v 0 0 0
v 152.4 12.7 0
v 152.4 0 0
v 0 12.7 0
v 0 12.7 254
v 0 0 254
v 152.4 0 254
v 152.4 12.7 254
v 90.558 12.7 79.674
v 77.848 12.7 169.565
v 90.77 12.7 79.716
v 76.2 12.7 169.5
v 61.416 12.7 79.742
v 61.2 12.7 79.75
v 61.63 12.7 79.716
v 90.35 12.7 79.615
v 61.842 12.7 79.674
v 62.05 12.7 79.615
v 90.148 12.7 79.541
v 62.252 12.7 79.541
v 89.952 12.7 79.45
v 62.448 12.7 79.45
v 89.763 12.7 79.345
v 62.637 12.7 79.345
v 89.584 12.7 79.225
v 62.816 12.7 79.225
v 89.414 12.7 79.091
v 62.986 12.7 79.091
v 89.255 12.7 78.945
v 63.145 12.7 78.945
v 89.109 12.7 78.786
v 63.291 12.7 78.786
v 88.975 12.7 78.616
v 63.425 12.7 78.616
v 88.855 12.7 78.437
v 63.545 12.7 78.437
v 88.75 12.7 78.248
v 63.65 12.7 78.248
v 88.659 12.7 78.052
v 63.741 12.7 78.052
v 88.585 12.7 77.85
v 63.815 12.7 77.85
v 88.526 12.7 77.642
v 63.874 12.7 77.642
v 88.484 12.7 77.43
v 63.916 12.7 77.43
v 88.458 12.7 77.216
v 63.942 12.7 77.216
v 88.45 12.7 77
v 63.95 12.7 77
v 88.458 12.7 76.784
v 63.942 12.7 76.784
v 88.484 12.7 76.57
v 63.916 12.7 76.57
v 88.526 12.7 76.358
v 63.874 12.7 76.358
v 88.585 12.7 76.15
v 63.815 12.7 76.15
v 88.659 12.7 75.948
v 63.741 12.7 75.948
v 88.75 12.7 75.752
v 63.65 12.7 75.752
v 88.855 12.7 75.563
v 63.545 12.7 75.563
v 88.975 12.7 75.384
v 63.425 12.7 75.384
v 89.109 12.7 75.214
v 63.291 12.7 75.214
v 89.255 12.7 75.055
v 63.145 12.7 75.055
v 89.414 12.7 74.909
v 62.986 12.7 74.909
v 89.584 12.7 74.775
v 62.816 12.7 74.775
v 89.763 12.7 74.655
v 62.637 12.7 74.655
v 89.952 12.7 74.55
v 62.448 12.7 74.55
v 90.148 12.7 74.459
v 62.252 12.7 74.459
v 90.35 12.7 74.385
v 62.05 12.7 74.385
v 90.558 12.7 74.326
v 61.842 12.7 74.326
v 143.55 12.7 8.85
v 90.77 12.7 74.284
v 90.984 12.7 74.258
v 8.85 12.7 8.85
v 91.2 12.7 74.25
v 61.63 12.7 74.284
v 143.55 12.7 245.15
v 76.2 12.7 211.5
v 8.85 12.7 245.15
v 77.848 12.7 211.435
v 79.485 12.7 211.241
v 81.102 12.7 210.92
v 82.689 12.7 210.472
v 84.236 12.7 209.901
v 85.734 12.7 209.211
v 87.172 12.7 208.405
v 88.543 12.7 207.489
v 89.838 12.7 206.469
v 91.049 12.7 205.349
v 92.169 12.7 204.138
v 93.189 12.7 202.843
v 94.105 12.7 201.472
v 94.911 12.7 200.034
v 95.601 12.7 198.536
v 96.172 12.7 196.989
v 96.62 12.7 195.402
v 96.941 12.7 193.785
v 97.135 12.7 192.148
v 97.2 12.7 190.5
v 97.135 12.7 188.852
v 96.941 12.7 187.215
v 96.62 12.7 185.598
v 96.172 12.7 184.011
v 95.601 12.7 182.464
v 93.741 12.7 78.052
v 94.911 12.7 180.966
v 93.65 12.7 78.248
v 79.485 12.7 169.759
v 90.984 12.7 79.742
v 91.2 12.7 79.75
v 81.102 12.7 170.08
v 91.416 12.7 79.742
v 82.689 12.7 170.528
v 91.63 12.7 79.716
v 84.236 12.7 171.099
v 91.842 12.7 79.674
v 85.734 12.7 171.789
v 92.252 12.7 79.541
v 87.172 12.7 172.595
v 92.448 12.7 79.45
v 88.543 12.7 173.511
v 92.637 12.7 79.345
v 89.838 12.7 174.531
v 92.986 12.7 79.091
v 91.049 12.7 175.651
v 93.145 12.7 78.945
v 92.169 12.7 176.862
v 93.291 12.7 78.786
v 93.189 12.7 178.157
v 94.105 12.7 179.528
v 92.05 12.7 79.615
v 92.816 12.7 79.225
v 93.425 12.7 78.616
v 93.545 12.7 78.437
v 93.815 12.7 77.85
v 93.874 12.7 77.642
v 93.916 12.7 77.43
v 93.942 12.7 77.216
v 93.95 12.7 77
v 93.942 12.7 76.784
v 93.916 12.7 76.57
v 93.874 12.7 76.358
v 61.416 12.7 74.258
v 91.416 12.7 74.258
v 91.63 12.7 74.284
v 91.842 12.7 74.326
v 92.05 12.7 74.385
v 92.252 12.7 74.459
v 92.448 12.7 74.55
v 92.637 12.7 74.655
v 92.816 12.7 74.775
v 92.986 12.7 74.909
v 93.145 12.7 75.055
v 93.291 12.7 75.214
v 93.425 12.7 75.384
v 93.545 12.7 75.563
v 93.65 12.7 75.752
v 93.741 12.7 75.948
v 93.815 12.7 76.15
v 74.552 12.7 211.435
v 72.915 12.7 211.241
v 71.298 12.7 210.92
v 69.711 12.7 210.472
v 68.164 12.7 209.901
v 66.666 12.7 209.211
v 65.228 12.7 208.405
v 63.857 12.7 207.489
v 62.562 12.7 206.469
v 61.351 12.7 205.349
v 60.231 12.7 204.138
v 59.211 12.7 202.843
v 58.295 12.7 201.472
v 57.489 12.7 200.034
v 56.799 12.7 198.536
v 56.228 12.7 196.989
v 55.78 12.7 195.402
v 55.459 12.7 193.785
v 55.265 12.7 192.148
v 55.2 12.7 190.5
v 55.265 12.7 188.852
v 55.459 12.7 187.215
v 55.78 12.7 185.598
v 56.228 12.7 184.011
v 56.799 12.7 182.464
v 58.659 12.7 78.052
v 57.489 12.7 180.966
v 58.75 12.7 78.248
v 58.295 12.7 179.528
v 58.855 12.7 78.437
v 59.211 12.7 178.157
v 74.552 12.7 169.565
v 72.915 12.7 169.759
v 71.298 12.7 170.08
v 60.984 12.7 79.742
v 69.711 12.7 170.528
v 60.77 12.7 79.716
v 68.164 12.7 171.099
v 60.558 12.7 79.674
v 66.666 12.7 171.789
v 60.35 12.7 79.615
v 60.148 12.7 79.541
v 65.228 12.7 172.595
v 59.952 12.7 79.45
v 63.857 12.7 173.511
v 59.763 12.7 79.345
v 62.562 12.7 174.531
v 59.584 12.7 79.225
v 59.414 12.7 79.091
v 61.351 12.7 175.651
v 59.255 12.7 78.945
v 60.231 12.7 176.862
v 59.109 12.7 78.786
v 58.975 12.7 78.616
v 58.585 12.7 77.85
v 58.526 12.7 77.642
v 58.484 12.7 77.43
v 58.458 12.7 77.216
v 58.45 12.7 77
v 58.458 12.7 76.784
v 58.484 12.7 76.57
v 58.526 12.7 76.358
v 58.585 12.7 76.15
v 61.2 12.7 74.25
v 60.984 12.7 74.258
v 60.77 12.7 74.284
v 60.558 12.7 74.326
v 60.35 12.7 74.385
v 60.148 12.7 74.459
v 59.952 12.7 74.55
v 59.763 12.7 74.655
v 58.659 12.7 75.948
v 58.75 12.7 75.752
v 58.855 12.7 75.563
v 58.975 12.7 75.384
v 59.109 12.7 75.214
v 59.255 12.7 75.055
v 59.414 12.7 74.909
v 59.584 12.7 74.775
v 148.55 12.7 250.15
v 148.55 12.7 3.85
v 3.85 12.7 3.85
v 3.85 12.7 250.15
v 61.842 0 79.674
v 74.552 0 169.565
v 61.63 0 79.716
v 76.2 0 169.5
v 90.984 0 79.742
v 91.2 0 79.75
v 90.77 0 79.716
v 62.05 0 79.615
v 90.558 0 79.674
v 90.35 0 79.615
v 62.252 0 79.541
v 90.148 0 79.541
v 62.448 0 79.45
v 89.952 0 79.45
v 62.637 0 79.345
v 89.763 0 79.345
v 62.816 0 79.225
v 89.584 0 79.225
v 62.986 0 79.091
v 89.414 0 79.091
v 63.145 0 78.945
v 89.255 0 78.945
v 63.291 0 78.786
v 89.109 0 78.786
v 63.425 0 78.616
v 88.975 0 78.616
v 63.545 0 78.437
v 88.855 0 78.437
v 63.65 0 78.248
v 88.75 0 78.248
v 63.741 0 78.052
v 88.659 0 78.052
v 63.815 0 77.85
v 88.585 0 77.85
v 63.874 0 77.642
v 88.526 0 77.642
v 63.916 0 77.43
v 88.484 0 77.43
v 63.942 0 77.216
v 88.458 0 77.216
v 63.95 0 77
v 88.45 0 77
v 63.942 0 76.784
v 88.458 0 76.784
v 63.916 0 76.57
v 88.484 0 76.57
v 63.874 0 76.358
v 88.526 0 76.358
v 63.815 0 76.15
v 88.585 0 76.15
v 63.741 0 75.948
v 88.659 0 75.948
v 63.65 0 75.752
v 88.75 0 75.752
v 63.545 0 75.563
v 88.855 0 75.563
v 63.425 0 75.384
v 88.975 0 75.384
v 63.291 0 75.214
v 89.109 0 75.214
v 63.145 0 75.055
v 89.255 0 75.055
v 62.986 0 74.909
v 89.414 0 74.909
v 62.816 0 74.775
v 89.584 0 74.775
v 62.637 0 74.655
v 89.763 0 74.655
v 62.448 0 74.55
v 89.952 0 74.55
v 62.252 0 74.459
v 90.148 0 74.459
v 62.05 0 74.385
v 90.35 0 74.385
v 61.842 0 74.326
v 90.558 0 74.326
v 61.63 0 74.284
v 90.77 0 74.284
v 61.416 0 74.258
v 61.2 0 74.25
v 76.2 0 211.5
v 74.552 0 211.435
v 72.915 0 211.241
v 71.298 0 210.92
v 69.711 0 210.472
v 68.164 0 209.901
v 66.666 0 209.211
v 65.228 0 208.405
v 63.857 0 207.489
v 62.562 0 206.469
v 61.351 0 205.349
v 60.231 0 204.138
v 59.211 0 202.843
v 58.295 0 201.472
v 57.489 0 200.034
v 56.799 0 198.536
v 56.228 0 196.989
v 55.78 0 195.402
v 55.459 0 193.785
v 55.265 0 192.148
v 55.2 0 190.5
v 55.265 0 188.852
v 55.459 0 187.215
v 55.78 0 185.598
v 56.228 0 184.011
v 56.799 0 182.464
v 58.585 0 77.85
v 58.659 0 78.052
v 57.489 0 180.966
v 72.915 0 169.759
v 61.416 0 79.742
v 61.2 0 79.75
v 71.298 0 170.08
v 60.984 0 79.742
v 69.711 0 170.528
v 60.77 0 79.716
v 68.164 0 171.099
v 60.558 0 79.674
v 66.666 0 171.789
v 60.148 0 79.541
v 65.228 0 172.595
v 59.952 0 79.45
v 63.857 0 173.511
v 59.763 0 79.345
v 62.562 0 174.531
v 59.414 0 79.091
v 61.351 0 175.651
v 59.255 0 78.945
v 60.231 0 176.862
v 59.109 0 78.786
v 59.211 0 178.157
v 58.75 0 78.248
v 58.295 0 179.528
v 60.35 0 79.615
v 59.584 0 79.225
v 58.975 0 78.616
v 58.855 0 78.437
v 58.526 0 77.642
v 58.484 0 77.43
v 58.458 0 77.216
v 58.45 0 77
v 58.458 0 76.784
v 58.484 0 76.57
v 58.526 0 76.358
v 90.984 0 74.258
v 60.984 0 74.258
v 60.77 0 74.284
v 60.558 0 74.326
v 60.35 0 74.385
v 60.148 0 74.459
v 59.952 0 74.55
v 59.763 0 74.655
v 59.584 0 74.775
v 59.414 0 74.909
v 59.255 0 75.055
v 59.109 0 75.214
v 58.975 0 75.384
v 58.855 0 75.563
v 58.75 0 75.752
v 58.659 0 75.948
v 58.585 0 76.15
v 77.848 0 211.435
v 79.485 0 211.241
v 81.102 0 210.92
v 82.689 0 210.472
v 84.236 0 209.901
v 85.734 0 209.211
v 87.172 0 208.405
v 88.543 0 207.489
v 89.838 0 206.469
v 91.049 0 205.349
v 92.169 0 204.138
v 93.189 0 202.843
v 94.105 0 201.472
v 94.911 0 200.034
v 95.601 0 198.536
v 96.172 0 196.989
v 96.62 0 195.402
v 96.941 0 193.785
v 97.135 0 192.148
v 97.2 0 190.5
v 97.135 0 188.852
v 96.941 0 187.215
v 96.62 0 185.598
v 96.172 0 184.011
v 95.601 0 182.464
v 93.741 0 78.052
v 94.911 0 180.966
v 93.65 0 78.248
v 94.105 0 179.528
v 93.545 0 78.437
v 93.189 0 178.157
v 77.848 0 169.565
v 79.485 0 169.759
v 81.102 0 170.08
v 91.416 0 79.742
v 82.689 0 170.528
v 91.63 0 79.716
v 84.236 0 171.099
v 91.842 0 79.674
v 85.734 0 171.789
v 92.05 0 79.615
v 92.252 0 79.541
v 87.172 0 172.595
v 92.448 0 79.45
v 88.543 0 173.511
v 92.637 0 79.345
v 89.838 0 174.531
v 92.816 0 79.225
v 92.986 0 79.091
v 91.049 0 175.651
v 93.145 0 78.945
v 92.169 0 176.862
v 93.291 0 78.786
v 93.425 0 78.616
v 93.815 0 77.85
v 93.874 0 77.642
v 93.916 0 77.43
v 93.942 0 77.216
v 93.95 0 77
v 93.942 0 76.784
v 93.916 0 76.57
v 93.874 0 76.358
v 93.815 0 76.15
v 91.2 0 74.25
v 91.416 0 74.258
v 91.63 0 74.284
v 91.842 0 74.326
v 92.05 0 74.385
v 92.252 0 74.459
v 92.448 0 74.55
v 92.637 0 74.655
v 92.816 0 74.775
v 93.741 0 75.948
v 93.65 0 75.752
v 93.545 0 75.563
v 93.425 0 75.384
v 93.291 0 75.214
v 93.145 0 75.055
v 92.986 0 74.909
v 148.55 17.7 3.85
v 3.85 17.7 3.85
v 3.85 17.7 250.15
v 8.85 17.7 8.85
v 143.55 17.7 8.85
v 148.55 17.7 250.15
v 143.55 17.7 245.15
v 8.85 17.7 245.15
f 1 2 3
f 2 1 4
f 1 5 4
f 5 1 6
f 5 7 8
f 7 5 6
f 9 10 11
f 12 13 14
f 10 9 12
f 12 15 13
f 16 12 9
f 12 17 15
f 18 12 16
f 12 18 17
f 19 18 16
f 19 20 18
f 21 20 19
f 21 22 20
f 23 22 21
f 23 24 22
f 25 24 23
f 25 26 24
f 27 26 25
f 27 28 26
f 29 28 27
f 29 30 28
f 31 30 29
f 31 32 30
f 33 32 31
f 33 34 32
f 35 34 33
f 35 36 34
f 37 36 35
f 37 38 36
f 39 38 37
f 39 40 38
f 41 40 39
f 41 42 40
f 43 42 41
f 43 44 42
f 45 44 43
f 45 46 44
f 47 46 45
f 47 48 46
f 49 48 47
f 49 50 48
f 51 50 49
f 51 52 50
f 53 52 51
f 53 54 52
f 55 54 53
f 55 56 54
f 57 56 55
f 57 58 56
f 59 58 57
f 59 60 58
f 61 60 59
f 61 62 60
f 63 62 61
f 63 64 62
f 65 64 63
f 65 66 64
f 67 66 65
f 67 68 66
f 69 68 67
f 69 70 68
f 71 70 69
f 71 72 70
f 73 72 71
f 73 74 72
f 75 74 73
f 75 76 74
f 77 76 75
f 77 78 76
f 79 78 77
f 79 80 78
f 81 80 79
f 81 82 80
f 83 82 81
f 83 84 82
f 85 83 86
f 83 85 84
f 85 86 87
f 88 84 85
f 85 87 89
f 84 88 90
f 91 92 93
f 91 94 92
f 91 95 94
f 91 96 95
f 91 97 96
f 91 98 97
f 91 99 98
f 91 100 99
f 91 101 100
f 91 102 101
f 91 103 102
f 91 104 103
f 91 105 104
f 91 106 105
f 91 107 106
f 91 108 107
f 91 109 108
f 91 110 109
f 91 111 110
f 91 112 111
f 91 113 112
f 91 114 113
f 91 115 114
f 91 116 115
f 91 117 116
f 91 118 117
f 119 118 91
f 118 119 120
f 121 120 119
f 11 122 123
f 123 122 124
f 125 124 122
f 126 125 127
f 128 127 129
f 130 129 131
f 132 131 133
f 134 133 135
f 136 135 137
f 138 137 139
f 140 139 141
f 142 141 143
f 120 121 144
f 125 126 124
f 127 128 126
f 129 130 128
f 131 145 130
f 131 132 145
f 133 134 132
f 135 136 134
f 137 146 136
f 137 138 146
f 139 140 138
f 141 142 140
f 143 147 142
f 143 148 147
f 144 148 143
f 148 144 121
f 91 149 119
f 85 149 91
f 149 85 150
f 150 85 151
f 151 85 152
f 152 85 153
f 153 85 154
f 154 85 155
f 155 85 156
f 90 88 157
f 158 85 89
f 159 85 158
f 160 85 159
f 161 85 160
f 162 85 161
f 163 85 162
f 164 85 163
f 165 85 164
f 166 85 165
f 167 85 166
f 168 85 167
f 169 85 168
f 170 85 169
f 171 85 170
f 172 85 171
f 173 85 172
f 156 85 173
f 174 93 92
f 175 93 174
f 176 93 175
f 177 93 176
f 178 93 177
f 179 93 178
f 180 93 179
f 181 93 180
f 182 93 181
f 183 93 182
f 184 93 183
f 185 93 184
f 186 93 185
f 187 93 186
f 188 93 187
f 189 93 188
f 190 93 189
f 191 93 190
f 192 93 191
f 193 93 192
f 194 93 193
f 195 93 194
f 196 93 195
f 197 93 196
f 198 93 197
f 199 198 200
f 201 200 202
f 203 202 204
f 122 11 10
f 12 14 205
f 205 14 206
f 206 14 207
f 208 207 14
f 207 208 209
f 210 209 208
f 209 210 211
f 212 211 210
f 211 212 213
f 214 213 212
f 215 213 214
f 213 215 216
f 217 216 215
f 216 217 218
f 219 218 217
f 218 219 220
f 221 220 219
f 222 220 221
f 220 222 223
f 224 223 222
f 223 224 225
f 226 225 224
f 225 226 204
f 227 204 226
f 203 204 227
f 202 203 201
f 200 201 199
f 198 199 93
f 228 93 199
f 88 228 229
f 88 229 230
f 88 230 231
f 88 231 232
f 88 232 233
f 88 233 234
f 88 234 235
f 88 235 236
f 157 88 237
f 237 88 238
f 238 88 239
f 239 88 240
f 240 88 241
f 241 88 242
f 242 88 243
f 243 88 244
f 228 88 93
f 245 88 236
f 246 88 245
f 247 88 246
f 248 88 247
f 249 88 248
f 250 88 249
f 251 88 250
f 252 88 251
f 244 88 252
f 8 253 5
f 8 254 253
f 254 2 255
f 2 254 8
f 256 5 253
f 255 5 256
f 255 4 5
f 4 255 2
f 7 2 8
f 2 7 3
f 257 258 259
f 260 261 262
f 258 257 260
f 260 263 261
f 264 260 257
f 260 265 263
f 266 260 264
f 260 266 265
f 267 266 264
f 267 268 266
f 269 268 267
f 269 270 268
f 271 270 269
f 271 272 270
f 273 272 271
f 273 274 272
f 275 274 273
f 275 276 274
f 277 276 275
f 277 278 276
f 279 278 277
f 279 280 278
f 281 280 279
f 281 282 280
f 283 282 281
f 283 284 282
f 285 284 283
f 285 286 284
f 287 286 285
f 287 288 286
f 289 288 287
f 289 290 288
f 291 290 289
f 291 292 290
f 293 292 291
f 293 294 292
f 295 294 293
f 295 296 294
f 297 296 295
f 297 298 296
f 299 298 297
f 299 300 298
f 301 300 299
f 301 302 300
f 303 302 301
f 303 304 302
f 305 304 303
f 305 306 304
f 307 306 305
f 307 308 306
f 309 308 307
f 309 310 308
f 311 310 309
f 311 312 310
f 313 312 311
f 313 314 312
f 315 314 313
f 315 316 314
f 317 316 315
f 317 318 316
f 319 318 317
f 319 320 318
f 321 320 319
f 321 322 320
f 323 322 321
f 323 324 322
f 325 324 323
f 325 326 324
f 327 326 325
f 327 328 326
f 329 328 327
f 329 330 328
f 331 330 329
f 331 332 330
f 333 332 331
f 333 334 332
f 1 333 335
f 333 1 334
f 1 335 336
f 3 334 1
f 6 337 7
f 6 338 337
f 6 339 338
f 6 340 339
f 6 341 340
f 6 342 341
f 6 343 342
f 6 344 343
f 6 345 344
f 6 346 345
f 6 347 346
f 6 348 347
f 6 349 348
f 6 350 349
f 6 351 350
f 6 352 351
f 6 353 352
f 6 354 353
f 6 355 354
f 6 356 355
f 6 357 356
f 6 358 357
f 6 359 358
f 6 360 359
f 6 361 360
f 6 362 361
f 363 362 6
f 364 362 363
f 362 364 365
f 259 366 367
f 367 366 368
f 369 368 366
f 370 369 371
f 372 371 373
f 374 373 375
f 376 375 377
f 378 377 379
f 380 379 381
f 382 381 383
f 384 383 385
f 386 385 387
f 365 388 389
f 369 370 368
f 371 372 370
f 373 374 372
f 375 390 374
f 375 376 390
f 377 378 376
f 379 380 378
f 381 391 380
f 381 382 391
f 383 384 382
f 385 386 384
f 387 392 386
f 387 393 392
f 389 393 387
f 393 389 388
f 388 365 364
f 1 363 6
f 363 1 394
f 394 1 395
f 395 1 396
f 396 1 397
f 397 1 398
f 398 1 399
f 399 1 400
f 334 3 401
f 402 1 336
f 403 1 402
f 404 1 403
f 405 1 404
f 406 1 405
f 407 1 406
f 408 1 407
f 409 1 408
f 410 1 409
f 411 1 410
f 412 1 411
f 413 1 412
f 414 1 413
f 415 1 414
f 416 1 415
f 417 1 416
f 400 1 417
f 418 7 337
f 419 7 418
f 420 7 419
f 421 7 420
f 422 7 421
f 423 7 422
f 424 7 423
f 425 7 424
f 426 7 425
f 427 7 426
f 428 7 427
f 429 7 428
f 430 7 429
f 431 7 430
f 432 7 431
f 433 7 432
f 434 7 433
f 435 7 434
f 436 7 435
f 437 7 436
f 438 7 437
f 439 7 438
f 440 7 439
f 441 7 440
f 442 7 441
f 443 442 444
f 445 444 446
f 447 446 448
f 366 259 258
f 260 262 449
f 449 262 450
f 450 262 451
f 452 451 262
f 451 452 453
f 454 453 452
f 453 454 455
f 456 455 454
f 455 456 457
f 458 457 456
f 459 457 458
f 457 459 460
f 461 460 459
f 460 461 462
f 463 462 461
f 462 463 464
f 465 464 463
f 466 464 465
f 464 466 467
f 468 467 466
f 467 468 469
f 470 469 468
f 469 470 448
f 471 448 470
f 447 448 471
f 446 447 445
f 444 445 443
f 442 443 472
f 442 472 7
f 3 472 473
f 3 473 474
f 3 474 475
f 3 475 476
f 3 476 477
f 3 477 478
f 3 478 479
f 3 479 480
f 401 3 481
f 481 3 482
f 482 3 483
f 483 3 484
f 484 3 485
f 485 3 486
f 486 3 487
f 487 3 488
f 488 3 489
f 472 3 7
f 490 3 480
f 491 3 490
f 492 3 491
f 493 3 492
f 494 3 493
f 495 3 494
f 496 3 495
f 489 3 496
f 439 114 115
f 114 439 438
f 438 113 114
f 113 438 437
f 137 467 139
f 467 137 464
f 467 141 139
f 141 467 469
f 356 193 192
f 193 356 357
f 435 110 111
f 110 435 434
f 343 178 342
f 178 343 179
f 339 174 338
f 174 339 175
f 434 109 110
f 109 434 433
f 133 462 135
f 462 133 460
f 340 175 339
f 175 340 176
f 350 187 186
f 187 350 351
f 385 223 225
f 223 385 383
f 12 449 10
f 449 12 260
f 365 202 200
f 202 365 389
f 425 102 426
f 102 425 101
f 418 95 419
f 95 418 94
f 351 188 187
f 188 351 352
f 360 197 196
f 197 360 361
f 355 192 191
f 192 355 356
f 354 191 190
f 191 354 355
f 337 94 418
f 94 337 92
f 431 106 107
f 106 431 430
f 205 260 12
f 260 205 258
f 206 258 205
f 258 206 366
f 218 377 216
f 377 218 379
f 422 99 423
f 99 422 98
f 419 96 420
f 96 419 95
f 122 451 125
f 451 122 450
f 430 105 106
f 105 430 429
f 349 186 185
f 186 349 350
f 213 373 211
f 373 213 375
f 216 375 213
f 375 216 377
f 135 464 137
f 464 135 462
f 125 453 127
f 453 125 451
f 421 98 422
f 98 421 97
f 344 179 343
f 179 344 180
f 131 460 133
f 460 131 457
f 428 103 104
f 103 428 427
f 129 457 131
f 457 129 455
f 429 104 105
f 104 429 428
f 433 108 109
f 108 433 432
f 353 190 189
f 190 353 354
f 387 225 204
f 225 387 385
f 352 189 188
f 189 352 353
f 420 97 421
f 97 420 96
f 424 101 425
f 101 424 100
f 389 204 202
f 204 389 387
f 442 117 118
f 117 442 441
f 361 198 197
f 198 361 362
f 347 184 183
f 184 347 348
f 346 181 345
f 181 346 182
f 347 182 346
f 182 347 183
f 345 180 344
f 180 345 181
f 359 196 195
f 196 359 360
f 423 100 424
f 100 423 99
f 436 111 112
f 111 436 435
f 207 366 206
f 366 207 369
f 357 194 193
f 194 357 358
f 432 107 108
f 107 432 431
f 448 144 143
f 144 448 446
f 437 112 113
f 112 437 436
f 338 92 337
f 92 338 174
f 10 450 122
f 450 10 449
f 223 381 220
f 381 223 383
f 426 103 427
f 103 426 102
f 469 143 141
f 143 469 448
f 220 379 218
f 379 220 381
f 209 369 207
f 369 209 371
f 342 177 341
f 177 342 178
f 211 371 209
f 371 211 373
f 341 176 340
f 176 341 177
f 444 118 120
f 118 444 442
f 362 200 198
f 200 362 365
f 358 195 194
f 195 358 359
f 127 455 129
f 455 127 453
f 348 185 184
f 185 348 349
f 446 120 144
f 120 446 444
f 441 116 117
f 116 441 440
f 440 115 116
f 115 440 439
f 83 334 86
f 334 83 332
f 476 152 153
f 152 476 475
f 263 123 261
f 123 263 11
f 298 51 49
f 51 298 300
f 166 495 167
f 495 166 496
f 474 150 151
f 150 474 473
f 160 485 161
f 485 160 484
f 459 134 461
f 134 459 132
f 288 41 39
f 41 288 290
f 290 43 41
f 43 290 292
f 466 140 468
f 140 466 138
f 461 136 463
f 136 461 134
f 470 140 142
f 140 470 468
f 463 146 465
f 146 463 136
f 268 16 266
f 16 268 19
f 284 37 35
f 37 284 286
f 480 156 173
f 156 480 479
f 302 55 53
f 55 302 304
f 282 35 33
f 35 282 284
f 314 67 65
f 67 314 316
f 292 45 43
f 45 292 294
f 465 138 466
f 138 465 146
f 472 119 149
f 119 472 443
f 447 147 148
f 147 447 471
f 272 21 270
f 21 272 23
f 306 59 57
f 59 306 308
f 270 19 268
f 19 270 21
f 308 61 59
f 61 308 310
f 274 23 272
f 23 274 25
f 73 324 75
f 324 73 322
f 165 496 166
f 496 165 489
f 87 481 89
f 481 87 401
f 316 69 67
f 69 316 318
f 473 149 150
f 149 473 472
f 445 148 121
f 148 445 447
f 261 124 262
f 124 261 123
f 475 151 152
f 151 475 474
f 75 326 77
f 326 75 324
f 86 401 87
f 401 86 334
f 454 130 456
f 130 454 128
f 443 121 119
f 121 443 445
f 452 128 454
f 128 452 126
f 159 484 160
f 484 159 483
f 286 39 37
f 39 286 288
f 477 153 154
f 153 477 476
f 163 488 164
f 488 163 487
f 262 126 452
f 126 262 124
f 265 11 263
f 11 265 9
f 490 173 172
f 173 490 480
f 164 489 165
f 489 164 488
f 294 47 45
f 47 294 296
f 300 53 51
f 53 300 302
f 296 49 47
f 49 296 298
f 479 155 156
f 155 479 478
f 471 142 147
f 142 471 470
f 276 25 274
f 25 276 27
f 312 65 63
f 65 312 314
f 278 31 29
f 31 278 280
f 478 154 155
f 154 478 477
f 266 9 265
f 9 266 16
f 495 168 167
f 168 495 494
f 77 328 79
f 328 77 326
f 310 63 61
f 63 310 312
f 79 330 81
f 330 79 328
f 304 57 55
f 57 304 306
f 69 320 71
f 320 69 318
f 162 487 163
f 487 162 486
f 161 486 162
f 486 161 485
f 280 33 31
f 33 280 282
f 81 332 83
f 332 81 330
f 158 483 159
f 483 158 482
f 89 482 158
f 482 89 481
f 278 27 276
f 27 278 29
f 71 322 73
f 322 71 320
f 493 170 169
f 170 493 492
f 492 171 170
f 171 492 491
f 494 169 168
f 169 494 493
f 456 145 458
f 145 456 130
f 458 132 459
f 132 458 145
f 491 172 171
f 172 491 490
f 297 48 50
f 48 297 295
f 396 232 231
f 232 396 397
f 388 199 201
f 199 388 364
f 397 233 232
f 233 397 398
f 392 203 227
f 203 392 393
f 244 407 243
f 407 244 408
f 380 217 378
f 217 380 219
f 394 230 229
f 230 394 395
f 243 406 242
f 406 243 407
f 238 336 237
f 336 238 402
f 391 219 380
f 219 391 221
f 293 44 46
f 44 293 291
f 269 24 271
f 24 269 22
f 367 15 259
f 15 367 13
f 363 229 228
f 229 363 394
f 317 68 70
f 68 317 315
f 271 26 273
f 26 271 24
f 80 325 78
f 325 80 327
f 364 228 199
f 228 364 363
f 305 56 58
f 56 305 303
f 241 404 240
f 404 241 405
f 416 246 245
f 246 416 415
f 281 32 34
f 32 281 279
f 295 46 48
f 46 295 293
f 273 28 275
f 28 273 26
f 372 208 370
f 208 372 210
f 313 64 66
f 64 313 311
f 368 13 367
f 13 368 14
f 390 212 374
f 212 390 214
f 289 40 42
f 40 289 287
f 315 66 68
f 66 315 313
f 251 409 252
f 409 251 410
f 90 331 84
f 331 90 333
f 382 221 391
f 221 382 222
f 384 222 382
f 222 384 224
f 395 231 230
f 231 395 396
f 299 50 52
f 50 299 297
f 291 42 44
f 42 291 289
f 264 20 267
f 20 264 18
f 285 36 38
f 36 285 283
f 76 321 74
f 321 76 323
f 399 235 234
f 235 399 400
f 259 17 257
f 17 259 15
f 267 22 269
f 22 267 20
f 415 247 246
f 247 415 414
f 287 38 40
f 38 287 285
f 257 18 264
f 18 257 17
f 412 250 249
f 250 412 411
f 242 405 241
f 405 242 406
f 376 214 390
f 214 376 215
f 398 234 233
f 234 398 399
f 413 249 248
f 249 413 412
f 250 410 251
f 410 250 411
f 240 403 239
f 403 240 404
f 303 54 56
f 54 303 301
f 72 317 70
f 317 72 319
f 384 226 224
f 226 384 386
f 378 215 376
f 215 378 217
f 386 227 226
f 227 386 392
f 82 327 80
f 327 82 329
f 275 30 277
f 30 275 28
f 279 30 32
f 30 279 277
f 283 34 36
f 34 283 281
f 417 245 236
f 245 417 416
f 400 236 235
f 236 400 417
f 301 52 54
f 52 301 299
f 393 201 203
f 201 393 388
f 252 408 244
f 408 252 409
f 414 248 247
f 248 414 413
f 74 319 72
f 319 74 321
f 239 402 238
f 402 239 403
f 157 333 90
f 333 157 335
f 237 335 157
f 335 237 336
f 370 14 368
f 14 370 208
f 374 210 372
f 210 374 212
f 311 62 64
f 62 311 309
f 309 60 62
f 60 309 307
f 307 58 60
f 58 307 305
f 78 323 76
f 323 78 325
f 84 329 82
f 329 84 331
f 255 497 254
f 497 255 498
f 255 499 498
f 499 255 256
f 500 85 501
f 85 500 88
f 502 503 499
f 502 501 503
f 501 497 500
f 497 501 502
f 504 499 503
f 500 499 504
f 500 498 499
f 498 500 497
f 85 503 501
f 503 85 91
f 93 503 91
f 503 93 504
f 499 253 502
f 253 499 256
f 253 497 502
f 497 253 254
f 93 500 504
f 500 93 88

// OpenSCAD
//Speedster dimension
$fn=80;
//Dimensions are in mm
panelThickness = 12.7;
height = 254;
//Front Panel Dimensions
frontWidth = 152.4;
//Side Panels Dimensions
sideWidth = 203.2;
//Back Panel Dimensions
backWidth = 152.4;
//Tweeter Dimensions
tweeterOuterDiameter = 102;
tweeterInnerDimensionY = 68;
tweeterInnerDimensionX = 57.5;
tweeterThickness = 5;
tweeterX = frontWidth/2;
tweeterY = height - 63.5;
tweeterScrewDiameter = 2.5;
tweeterScrewX = 31;
tweeterScrewY = 31;
//Woofer Dimensions
wooferDiameter = 96.3;
wooferX = frontWidth/2;
wooferY = height - 165.1;
wooferScrewDiameter = 2.5;
wooferScrewX = 41;
wooferScrewY = 41;
//Top and Bottom Panels
topWidth = 6;
topLength = 8;
//Connection Joints/Grooves
grooveThickness = 6;
grooveDepth = 6;
//Port Dimensions
portDiameter = 42;
portX = backWidth/2;
portY = height - 63.5;
//Terminal Hole Dimensions
terminalDiameter = 5.5;
terminalY = (height)/2 - 50;
terminal1X =(backWidth)/2 + 15;
terminal2X = (backWidth)/2 - 15;
/*
//Union the panels for the front half
difference(){
    union(){
//Front Panel
    difference(){
        linear_extrude(height)
        square([frontWidth, panelThickness]);

        //Woofer hole cut out
        translate([wooferX, panelThickness, wooferY])
        rotate([90, 0, 0])
        linear_extrude(panelThickness)
        circle(d=wooferDiameter);
        
        //Woofer Screws
        translate([wooferX + wooferScrewX, panelThickness, wooferY + wooferScrewY])
        rotate([90,0,0])
        linear_extrude(panelThickness)
        circle(d=wooferScrewDiameter);
        
        translate([wooferX + wooferScrewX, panelThickness, wooferY - wooferScrewY])
        rotate([90,0,0])
        linear_extrude(panelThickness)
        circle(d=wooferScrewDiameter);

        translate([wooferX - wooferScrewX, panelThickness, wooferY + wooferScrewY])
        rotate([90,0,0])
        linear_extrude(panelThickness)
        circle(d=wooferScrewDiameter);

        translate([wooferX - wooferScrewX, panelThickness, wooferY - wooferScrewY])
        rotate([90,0,0])
        linear_extrude(panelThickness)
        circle(d=wooferScrewDiameter);

        //Tweeter Outer hole cut out
        translate([tweeterX, tweeterThickness, tweeterY])
        rotate([90, 0, 0])
        linear_extrude(tweeterThickness)
        circle(d=tweeterOuterDiameter);
        
        //Tweeter Screws
        translate([tweeterX + tweeterScrewX, tweeterThickness + panelThickness, tweeterY + tweeterScrewY])
        rotate([90, 0, 0])
        linear_extrude(panelThickness)
        circle(d=tweeterScrewDiameter);
        
        translate([tweeterX + tweeterScrewX, tweeterThickness + panelThickness, tweeterY - tweeterScrewY])
        rotate([90, 0, 0])
        linear_extrude(panelThickness)
        circle(d=tweeterScrewDiameter);
        
        translate([tweeterX - tweeterScrewX, tweeterThickness + panelThickness, tweeterY + tweeterScrewY])
        rotate([90, 0, 0])
        linear_extrude(panelThickness)
        circle(d=tweeterScrewDiameter);
        
        translate([tweeterX - tweeterScrewX, tweeterThickness + panelThickness, tweeterY - tweeterScrewY])
        rotate([90, 0, 0])
        linear_extrude(panelThickness)
        circle(d=tweeterScrewDiameter);

        
        //Tweeter Inner hole cut out
        translate([tweeterX - tweeterInnerDimensionX/2, tweeterThickness + panelThickness, tweeterY - tweeterInnerDimensionY/2])
        rotate([90,0,0])
        linear_extrude(panelThickness)
        square([tweeterInnerDimensionX, tweeterInnerDimensionY]);
    }

    //Right Panel
    translate([frontWidth - panelThickness, 0, 0])
    linear_extrude(height)
    square([panelThickness, sideWidth]);

    //Left Panel
    linear_extrude(height)
    square([panelThickness, sideWidth]);

    //Bottom Panel
    linear_extrude(panelThickness)
    square([frontWidth, sideWidth]);

    //Top Panel
    translate([0,0, height - panelThickness])
    linear_extrude(panelThickness)
    square([frontWidth, sideWidth]);
}

    //Added grooves for joint connection with back
    translate([panelThickness/2 - grooveThickness/2, sideWidth - grooveThickness, panelThickness/2 - grooveThickness/2])
    linear_extrude(grooveDepth)
    square([frontWidth - panelThickness, grooveThickness]);

    translate([panelThickness/2 - grooveThickness/2, sideWidth - grooveThickness, height - panelThickness/2 - grooveThickness/2])
    linear_extrude(grooveDepth)
    square([frontWidth - panelThickness + grooveThickness, grooveThickness]);

    translate([frontWidth - panelThickness/2 - grooveThickness/2, sideWidth - grooveThickness, panelThickness/2 - grooveThickness/2])
    linear_extrude(height - panelThickness)
    square([grooveThickness, grooveDepth]);

    translate([panelThickness/2 - grooveThickness/2, sideWidth - grooveThickness, panelThickness/2 - grooveThickness/2])
    linear_extrude(height - panelThickness)
    square([grooveThickness, grooveDepth]);
}
*/

//Back Panel
union(){
    
    difference(){
        linear_extrude(height)
        square([backWidth, panelThickness]);

        translate([portX, 0, portY])
        rotate([-90,0,0])
        linear_extrude(panelThickness)
        circle(d=portDiameter);

        translate([terminal1X, 0, terminalY])
        rotate([-90,0,0])
        linear_extrude(panelThickness)
        circle(d = terminalDiameter);

        translate([terminal2X, 0, terminalY])
        rotate([-90,0,0])
        linear_extrude(panelThickness)
        circle(d = terminalDiameter);
    }

    //Back Panel Joint Connection
    //Added grooves for joint connection with back
    translate([panelThickness/2 - (grooveThickness-1)/2, panelThickness, panelThickness/2 - (grooveThickness-1)/2])
    linear_extrude(grooveDepth - 1)
    square([frontWidth - panelThickness, grooveThickness -1]);

    translate([panelThickness/2 - (grooveThickness-1)/2, panelThickness, height - panelThickness/2 - (grooveThickness-1)/2])
    linear_extrude(grooveDepth - 1)
    square([frontWidth - panelThickness -1 +grooveThickness, grooveThickness - 1]);

    translate([frontWidth - panelThickness/2 - (grooveThickness-1)/2, panelThickness, panelThickness/2 - (grooveThickness-1)/2])
    linear_extrude(height - panelThickness)
    square([grooveThickness - 1, grooveDepth - 1]);

    translate([panelThickness/2 - (grooveThickness-1)/2, panelThickness, panelThickness/2 - (grooveThickness-1)/2])
    linear_extrude(height - panelThickness)
    square([grooveThickness - 1, grooveDepth - 1]);
};
